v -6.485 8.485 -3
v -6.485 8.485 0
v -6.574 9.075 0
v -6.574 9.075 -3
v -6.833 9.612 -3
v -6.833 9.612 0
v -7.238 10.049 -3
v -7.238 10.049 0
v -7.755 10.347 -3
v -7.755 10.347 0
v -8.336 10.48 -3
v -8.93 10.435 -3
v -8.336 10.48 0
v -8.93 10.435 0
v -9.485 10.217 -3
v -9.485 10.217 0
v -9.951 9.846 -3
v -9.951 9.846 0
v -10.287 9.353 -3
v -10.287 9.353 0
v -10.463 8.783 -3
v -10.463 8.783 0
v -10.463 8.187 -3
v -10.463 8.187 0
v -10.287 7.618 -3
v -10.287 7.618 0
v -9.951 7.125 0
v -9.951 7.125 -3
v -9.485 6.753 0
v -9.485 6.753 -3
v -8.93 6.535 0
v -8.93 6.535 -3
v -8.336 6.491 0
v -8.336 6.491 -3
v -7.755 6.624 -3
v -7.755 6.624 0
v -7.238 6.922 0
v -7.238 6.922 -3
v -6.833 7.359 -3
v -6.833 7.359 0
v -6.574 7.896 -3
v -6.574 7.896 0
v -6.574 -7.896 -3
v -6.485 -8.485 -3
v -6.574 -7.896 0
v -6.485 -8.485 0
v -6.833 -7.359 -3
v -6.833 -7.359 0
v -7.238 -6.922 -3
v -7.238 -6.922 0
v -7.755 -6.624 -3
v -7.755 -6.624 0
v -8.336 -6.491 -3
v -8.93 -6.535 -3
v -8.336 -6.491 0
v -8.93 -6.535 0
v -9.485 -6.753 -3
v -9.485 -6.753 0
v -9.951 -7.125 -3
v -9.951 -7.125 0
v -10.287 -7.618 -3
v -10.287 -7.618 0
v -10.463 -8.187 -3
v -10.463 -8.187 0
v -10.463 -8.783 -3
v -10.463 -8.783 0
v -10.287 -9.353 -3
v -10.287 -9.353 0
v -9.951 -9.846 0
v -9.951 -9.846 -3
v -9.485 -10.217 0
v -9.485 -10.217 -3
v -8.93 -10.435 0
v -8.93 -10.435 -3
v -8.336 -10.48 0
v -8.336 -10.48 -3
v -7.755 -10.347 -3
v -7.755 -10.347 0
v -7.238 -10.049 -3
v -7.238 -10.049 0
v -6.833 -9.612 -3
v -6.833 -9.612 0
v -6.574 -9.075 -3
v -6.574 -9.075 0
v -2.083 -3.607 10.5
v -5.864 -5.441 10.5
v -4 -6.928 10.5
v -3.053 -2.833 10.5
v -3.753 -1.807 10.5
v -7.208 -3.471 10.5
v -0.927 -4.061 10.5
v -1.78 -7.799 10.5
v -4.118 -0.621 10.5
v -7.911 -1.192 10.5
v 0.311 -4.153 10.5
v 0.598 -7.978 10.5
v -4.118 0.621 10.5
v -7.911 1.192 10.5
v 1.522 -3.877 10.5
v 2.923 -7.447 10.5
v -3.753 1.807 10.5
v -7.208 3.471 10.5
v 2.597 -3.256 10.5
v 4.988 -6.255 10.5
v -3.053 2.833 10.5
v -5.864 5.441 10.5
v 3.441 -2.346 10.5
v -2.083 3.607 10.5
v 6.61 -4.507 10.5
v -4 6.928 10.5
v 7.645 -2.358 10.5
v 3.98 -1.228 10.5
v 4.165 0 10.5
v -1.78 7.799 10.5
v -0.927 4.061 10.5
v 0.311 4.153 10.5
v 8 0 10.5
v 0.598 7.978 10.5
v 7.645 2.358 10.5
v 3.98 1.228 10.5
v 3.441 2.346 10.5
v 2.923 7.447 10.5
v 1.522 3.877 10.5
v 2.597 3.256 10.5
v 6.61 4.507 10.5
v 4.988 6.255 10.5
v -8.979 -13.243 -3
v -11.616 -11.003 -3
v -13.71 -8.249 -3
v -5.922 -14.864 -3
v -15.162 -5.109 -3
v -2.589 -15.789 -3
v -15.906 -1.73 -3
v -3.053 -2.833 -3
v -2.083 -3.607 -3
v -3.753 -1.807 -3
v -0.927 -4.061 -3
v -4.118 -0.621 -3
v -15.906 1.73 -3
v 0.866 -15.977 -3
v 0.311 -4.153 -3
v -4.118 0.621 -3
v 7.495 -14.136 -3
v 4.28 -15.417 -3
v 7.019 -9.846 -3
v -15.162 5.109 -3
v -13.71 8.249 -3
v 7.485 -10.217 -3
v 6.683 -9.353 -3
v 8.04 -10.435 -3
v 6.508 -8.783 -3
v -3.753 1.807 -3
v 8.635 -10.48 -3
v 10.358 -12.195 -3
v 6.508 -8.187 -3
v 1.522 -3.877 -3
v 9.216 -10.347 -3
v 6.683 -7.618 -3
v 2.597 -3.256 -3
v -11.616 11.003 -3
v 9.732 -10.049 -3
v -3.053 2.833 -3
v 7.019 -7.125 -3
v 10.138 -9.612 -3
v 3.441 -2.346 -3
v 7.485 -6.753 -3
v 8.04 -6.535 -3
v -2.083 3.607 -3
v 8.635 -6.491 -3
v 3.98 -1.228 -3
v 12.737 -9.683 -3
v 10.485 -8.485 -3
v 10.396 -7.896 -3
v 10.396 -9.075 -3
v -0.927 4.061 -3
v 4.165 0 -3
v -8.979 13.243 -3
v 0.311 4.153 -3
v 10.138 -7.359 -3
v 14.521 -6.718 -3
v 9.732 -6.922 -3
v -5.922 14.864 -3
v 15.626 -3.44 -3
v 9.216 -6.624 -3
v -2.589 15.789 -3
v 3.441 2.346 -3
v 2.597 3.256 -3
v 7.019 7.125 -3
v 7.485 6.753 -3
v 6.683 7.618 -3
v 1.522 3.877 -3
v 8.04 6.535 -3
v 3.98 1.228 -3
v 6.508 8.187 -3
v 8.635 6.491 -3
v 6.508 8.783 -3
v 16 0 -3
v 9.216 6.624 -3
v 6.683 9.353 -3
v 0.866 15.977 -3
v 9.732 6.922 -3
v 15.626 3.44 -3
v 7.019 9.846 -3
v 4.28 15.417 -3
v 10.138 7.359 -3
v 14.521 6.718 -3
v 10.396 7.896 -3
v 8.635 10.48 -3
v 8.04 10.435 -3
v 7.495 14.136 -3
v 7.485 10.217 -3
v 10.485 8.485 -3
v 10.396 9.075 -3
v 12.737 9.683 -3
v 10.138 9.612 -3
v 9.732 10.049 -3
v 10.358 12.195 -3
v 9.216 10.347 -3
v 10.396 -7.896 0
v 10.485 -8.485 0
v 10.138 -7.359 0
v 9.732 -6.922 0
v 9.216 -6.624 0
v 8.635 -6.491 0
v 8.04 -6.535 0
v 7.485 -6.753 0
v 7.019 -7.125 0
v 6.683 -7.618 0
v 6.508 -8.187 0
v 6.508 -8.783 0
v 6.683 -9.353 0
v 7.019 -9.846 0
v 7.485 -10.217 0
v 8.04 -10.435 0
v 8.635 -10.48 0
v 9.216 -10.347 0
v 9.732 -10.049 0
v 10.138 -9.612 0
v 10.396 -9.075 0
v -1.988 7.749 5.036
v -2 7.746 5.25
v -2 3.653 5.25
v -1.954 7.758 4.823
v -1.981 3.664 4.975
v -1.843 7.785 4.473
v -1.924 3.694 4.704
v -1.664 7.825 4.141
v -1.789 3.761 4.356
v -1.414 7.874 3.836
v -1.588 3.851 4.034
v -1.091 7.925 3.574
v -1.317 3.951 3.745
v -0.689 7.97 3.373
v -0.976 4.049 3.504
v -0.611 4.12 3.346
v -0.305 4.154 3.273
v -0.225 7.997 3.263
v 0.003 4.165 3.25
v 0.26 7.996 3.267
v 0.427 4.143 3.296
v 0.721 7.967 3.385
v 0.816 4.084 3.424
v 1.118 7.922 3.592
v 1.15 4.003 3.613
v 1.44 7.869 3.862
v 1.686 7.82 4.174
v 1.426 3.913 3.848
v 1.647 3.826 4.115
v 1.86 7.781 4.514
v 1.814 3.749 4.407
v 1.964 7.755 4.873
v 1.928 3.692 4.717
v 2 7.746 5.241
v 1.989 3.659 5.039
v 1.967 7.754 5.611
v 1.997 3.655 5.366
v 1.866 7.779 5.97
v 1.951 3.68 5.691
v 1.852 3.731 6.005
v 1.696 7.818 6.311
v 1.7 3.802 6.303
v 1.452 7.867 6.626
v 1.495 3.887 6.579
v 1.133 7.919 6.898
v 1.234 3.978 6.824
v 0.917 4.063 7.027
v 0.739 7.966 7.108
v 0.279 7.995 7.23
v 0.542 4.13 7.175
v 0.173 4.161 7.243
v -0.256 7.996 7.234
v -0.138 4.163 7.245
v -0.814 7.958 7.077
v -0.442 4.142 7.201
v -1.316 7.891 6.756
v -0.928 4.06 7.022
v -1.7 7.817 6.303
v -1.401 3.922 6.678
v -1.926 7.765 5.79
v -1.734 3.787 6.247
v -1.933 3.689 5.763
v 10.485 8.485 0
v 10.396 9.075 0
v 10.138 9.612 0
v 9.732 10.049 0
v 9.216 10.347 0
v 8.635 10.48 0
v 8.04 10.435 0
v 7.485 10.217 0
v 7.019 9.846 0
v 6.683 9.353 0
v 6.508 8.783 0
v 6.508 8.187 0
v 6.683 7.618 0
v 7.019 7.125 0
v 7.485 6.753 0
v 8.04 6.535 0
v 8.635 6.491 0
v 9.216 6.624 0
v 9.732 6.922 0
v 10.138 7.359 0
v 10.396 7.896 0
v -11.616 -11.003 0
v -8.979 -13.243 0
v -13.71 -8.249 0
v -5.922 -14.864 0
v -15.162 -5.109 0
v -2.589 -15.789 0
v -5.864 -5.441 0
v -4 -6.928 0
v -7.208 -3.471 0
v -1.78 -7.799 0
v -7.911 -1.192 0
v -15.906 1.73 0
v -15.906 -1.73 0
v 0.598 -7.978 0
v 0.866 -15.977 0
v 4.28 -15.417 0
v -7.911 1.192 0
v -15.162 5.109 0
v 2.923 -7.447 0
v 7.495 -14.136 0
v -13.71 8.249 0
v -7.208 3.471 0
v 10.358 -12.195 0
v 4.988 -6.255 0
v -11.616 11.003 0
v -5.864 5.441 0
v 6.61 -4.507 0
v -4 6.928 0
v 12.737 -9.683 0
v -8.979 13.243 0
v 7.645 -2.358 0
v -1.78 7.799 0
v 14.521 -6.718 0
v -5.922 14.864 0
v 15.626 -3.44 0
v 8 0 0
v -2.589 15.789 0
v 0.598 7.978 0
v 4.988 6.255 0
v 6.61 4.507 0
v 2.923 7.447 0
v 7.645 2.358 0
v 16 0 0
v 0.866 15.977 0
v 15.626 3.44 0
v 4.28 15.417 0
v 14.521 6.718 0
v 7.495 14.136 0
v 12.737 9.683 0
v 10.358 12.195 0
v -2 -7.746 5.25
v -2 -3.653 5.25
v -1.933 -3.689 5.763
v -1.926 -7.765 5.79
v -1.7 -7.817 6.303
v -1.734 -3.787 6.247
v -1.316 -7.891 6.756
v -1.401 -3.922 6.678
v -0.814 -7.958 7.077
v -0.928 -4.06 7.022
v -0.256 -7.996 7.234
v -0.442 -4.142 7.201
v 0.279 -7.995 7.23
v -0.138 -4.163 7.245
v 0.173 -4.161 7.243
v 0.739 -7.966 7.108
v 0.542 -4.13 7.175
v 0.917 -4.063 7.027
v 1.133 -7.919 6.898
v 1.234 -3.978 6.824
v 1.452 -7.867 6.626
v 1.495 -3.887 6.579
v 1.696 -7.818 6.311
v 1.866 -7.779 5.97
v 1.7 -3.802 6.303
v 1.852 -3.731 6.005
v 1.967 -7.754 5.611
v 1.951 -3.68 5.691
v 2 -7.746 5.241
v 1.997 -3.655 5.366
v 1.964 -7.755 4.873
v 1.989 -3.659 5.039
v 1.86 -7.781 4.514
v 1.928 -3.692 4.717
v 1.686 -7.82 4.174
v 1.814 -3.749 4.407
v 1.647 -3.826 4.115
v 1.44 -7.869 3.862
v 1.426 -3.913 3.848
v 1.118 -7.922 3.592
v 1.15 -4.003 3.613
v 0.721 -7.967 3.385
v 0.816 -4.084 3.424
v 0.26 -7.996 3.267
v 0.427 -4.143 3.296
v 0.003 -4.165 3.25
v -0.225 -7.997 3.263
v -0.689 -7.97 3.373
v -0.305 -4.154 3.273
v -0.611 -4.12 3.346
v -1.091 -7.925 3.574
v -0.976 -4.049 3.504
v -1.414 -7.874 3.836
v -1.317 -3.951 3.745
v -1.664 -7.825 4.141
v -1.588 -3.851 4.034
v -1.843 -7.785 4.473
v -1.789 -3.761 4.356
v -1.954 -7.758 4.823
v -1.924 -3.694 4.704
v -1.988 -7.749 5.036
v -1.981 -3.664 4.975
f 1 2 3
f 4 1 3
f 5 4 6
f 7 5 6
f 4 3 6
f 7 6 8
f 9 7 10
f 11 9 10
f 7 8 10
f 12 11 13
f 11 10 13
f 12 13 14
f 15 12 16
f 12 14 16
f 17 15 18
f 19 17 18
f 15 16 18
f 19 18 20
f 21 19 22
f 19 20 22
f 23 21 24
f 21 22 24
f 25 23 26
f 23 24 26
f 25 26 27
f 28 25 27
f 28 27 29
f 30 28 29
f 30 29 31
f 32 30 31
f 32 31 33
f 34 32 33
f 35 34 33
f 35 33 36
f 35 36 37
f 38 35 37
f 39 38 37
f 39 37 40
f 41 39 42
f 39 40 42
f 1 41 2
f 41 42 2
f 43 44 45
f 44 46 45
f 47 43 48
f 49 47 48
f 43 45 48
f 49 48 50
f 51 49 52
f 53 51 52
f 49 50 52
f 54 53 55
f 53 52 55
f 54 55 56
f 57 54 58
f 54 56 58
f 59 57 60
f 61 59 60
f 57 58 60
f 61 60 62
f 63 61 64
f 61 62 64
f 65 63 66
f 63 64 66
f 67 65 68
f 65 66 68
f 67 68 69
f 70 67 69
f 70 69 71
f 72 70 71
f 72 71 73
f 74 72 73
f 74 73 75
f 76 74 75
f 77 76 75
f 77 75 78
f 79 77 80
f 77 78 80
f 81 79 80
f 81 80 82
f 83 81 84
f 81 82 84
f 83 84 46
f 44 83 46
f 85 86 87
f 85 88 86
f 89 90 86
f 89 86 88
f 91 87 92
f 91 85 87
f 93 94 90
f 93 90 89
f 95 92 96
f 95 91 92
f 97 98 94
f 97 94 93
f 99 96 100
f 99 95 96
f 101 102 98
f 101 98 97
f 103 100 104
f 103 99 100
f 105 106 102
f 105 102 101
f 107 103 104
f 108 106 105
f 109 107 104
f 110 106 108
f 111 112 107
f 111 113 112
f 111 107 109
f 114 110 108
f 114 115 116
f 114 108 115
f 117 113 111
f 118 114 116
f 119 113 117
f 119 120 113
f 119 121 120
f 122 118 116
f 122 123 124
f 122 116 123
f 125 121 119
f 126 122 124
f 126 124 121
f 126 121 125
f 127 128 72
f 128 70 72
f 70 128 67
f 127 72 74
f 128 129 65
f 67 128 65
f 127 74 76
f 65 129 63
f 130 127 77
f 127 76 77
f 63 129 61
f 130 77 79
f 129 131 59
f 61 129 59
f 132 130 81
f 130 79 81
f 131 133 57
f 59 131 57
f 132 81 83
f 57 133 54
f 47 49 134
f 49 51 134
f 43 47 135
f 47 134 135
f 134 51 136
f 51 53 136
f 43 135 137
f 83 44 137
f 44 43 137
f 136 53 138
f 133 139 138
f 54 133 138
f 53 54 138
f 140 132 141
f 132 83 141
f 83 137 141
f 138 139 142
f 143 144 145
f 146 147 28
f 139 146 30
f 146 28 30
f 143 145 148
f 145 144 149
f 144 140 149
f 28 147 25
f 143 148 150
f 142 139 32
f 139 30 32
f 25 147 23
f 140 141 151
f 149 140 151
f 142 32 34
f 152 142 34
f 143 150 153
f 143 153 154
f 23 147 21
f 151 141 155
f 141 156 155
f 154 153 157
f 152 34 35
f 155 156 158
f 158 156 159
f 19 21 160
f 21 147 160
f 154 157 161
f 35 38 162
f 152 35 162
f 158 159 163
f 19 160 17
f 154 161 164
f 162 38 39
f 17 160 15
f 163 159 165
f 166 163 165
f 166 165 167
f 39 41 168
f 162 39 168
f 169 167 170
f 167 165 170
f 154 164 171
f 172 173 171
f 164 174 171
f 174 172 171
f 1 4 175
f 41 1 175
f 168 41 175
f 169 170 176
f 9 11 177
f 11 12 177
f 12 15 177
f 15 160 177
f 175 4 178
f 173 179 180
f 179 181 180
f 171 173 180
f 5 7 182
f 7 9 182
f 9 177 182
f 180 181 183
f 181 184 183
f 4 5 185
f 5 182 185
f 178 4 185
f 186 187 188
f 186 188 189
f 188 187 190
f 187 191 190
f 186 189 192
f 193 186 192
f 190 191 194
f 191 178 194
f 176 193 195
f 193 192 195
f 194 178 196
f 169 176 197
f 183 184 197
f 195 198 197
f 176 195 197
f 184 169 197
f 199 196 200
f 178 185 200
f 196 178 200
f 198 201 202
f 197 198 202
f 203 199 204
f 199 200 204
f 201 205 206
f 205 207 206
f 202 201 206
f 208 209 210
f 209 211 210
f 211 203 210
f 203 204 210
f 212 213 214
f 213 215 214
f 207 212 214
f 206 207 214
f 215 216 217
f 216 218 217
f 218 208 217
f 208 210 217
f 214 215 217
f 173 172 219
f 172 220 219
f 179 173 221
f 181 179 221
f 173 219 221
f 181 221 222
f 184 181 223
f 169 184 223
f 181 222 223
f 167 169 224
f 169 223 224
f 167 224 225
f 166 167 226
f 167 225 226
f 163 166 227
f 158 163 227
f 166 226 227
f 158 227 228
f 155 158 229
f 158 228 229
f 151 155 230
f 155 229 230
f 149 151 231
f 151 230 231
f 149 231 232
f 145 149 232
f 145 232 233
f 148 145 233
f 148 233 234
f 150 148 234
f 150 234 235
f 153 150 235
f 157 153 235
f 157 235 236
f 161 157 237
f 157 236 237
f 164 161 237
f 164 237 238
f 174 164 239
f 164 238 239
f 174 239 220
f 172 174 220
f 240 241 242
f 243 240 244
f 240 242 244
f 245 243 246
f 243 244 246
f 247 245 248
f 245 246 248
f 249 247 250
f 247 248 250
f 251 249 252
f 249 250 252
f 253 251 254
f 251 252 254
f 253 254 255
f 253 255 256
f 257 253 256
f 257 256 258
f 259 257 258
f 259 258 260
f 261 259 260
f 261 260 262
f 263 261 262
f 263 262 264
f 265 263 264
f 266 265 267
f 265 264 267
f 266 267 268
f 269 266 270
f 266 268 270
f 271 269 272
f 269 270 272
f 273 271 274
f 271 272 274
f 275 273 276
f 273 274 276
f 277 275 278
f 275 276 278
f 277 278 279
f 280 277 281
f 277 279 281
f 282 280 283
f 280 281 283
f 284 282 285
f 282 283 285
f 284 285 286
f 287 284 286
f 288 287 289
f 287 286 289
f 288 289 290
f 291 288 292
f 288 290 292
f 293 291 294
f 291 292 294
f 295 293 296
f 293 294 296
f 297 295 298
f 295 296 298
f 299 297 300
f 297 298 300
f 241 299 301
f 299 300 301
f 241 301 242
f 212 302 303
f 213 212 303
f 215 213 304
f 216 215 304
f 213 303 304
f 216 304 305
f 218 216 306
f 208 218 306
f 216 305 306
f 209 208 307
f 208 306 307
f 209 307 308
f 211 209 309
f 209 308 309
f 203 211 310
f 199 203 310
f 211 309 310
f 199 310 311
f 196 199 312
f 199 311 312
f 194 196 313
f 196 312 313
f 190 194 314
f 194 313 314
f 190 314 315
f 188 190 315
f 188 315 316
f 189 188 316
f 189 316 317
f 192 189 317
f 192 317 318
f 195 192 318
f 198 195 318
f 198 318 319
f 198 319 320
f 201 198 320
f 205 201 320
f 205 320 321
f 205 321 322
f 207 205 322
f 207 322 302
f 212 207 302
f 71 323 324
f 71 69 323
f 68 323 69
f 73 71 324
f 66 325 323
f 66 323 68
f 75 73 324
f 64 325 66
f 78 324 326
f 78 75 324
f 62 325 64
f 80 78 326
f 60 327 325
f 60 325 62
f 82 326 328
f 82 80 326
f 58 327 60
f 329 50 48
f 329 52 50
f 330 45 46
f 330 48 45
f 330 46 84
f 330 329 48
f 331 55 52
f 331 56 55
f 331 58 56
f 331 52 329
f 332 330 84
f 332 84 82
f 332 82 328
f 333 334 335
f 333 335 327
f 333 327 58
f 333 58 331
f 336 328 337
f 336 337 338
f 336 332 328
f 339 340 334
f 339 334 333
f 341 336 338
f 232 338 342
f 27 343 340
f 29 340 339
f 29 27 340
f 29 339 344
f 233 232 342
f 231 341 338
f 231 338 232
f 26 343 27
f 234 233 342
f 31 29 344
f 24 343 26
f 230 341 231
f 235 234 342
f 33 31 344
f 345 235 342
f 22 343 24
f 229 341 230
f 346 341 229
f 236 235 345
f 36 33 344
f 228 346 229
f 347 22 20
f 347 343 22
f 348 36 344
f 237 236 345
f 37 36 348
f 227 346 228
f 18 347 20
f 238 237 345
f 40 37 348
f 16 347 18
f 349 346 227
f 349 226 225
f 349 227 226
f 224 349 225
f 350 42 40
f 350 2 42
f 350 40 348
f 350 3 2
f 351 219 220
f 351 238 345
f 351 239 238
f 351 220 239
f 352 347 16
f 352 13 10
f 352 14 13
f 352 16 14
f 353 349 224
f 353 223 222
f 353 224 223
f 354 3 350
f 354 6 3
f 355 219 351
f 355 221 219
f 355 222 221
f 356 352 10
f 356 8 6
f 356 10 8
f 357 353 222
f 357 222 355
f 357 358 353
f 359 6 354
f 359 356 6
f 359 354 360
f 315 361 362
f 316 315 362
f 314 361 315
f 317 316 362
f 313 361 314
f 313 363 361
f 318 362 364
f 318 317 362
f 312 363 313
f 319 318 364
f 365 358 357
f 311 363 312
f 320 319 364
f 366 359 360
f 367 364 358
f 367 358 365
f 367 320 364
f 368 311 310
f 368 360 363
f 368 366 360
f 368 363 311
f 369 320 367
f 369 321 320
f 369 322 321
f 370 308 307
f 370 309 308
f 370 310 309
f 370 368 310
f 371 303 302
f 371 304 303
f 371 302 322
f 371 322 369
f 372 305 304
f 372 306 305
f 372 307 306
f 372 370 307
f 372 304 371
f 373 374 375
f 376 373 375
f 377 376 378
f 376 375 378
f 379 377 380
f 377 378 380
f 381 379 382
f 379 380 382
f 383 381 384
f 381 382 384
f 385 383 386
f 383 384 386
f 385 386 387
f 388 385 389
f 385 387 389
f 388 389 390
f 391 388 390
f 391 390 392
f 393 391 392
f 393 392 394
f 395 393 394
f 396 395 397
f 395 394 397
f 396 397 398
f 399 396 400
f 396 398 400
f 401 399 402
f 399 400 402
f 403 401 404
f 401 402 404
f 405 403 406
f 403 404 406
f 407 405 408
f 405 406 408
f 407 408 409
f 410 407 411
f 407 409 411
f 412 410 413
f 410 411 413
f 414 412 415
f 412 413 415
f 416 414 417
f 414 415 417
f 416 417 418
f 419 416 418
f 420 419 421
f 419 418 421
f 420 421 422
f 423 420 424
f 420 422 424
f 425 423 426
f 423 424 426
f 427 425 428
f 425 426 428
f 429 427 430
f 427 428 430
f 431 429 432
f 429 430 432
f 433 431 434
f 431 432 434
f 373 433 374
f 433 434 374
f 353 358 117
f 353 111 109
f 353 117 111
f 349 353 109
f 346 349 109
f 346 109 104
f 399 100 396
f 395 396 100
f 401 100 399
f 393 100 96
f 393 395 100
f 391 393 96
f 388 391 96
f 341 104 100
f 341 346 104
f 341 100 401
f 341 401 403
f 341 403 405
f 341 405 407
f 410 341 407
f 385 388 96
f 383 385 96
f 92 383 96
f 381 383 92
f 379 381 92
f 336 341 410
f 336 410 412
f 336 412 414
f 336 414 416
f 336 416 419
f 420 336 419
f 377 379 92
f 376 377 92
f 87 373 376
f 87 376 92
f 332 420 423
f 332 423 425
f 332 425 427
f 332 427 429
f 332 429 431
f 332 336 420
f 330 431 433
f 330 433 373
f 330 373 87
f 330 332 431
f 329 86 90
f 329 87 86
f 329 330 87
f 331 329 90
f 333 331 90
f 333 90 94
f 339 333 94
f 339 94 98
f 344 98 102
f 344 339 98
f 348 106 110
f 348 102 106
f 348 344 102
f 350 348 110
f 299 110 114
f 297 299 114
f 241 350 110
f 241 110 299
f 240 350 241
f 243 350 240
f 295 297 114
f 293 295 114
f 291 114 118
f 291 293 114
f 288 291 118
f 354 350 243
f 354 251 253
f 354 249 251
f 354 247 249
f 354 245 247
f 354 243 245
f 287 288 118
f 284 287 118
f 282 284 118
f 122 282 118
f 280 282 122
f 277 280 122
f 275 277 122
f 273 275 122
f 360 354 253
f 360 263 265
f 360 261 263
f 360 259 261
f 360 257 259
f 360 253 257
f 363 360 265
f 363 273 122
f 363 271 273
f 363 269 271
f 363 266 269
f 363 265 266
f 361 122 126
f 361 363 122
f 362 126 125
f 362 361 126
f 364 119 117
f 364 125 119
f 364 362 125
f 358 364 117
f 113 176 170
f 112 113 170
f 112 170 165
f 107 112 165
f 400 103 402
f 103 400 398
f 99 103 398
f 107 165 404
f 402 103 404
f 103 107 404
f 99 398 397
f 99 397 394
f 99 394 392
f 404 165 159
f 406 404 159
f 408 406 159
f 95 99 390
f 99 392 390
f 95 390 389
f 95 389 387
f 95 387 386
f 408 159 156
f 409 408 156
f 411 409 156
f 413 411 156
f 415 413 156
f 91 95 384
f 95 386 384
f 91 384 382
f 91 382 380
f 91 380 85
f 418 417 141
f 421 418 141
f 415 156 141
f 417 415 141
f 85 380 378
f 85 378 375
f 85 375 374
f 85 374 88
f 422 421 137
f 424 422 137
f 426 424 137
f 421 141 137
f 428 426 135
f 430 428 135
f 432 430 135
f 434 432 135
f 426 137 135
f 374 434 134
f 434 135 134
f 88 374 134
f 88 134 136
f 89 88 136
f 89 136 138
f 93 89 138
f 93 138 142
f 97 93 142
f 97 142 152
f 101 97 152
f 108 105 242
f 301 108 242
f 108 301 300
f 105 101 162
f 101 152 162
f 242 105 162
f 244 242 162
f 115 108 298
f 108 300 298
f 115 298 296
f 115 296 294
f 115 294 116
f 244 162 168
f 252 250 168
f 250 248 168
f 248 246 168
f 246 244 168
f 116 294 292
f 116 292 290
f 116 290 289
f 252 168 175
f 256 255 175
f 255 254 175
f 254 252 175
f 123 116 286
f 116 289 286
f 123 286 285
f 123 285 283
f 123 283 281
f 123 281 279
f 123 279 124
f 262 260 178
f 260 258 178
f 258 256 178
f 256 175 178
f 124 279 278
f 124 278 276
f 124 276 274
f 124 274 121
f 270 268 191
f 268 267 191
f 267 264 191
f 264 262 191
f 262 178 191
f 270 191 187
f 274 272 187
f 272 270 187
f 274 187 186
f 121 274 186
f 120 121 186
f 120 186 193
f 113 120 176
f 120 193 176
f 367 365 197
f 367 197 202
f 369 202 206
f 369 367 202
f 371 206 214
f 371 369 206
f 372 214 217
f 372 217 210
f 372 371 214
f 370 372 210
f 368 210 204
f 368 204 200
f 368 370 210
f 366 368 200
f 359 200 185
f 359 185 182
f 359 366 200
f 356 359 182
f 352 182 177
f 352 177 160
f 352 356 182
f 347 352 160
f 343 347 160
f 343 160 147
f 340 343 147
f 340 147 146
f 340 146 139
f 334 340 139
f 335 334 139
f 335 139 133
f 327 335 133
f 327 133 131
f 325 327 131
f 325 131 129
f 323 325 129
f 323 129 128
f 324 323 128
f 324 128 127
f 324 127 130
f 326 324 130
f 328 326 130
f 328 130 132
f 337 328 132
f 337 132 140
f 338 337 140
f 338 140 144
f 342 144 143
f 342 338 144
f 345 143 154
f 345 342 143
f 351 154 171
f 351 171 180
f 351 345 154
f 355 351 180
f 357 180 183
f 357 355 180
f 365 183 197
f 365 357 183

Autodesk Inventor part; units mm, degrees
ref_plane "YZ Plane" through (0, 0, 0) normal (1, 0, 0) x (0, 1, 0)
ref_plane "XZ Plane" through (0, 0, 0) normal (0, 1, 0) x (-1, 0, 0)
ref_plane "XY Plane" through (0, 0, 0) normal (0, 0, 1) x (1, 0, 0)
sketch "Base" plane through (0, 0, 0) normal (0, 0, 1) x (1, 0, 0)
  circle A0 centre (0, 0) radius 4.165
  circle A1 centre (0, 0) radius 8
  circle A2 centre (0, 0) radius 16
  line L0 (-8.4853, 8.4853) -> (8.4853, 8.4853) construction
  line L1 (8.4853, 8.4853) -> (8.4853, -8.4853) construction
  line L2 (8.4853, -8.4853) -> (-8.4853, -8.4853) construction
  line L3 (-8.4853, -8.4853) -> (-8.4853, 8.4853) construction
  circle A3 centre (0, 0) radius 13.4763 construction
  circle A4 centre (0, 0) radius 14 construction
  circle A5 centre (8.4853, 8.4853) radius 2
  circle A6 centre (8.4853, -8.4853) radius 2
  circle A7 centre (-8.4853, -8.4853) radius 2
  circle A8 centre (-8.4853, 8.4853) radius 2
  dimension "d0" = 8.33
  dimension "d1" = 16
  dimension "d2" = 32
  dimension "d3" = 2.5237
  dimension "d4" = 2
  dimension "d5" = 4
extrude "BaseFeature" add sketch "Base" against normal blind 3 contours A1 | A2
extrude "MountFeature" add sketch "Base" along normal blind 10.5 contours A1
sketch "SetScrewHole" plane through (0, 0, 0) normal (0, 1, 0) x (-1, 0, 0)
  circle A0 centre (0, 5.25) radius 2
  line L0 (8, 10.5) -> (-8, 10.5) construction
  line L1 (-8, 0) -> (8, 0) construction
  line L2 (-4.165, 10.5) -> (4.165, 10.5) projected
  line L3 (0, 10.5) -> (0, 0) construction
  dimension "d10" = 4
extrude "SetScrewHoleFeature" cut sketch "SetScrewHole" along normal through all both and the other way through all
properties part number "Hub8mm"
